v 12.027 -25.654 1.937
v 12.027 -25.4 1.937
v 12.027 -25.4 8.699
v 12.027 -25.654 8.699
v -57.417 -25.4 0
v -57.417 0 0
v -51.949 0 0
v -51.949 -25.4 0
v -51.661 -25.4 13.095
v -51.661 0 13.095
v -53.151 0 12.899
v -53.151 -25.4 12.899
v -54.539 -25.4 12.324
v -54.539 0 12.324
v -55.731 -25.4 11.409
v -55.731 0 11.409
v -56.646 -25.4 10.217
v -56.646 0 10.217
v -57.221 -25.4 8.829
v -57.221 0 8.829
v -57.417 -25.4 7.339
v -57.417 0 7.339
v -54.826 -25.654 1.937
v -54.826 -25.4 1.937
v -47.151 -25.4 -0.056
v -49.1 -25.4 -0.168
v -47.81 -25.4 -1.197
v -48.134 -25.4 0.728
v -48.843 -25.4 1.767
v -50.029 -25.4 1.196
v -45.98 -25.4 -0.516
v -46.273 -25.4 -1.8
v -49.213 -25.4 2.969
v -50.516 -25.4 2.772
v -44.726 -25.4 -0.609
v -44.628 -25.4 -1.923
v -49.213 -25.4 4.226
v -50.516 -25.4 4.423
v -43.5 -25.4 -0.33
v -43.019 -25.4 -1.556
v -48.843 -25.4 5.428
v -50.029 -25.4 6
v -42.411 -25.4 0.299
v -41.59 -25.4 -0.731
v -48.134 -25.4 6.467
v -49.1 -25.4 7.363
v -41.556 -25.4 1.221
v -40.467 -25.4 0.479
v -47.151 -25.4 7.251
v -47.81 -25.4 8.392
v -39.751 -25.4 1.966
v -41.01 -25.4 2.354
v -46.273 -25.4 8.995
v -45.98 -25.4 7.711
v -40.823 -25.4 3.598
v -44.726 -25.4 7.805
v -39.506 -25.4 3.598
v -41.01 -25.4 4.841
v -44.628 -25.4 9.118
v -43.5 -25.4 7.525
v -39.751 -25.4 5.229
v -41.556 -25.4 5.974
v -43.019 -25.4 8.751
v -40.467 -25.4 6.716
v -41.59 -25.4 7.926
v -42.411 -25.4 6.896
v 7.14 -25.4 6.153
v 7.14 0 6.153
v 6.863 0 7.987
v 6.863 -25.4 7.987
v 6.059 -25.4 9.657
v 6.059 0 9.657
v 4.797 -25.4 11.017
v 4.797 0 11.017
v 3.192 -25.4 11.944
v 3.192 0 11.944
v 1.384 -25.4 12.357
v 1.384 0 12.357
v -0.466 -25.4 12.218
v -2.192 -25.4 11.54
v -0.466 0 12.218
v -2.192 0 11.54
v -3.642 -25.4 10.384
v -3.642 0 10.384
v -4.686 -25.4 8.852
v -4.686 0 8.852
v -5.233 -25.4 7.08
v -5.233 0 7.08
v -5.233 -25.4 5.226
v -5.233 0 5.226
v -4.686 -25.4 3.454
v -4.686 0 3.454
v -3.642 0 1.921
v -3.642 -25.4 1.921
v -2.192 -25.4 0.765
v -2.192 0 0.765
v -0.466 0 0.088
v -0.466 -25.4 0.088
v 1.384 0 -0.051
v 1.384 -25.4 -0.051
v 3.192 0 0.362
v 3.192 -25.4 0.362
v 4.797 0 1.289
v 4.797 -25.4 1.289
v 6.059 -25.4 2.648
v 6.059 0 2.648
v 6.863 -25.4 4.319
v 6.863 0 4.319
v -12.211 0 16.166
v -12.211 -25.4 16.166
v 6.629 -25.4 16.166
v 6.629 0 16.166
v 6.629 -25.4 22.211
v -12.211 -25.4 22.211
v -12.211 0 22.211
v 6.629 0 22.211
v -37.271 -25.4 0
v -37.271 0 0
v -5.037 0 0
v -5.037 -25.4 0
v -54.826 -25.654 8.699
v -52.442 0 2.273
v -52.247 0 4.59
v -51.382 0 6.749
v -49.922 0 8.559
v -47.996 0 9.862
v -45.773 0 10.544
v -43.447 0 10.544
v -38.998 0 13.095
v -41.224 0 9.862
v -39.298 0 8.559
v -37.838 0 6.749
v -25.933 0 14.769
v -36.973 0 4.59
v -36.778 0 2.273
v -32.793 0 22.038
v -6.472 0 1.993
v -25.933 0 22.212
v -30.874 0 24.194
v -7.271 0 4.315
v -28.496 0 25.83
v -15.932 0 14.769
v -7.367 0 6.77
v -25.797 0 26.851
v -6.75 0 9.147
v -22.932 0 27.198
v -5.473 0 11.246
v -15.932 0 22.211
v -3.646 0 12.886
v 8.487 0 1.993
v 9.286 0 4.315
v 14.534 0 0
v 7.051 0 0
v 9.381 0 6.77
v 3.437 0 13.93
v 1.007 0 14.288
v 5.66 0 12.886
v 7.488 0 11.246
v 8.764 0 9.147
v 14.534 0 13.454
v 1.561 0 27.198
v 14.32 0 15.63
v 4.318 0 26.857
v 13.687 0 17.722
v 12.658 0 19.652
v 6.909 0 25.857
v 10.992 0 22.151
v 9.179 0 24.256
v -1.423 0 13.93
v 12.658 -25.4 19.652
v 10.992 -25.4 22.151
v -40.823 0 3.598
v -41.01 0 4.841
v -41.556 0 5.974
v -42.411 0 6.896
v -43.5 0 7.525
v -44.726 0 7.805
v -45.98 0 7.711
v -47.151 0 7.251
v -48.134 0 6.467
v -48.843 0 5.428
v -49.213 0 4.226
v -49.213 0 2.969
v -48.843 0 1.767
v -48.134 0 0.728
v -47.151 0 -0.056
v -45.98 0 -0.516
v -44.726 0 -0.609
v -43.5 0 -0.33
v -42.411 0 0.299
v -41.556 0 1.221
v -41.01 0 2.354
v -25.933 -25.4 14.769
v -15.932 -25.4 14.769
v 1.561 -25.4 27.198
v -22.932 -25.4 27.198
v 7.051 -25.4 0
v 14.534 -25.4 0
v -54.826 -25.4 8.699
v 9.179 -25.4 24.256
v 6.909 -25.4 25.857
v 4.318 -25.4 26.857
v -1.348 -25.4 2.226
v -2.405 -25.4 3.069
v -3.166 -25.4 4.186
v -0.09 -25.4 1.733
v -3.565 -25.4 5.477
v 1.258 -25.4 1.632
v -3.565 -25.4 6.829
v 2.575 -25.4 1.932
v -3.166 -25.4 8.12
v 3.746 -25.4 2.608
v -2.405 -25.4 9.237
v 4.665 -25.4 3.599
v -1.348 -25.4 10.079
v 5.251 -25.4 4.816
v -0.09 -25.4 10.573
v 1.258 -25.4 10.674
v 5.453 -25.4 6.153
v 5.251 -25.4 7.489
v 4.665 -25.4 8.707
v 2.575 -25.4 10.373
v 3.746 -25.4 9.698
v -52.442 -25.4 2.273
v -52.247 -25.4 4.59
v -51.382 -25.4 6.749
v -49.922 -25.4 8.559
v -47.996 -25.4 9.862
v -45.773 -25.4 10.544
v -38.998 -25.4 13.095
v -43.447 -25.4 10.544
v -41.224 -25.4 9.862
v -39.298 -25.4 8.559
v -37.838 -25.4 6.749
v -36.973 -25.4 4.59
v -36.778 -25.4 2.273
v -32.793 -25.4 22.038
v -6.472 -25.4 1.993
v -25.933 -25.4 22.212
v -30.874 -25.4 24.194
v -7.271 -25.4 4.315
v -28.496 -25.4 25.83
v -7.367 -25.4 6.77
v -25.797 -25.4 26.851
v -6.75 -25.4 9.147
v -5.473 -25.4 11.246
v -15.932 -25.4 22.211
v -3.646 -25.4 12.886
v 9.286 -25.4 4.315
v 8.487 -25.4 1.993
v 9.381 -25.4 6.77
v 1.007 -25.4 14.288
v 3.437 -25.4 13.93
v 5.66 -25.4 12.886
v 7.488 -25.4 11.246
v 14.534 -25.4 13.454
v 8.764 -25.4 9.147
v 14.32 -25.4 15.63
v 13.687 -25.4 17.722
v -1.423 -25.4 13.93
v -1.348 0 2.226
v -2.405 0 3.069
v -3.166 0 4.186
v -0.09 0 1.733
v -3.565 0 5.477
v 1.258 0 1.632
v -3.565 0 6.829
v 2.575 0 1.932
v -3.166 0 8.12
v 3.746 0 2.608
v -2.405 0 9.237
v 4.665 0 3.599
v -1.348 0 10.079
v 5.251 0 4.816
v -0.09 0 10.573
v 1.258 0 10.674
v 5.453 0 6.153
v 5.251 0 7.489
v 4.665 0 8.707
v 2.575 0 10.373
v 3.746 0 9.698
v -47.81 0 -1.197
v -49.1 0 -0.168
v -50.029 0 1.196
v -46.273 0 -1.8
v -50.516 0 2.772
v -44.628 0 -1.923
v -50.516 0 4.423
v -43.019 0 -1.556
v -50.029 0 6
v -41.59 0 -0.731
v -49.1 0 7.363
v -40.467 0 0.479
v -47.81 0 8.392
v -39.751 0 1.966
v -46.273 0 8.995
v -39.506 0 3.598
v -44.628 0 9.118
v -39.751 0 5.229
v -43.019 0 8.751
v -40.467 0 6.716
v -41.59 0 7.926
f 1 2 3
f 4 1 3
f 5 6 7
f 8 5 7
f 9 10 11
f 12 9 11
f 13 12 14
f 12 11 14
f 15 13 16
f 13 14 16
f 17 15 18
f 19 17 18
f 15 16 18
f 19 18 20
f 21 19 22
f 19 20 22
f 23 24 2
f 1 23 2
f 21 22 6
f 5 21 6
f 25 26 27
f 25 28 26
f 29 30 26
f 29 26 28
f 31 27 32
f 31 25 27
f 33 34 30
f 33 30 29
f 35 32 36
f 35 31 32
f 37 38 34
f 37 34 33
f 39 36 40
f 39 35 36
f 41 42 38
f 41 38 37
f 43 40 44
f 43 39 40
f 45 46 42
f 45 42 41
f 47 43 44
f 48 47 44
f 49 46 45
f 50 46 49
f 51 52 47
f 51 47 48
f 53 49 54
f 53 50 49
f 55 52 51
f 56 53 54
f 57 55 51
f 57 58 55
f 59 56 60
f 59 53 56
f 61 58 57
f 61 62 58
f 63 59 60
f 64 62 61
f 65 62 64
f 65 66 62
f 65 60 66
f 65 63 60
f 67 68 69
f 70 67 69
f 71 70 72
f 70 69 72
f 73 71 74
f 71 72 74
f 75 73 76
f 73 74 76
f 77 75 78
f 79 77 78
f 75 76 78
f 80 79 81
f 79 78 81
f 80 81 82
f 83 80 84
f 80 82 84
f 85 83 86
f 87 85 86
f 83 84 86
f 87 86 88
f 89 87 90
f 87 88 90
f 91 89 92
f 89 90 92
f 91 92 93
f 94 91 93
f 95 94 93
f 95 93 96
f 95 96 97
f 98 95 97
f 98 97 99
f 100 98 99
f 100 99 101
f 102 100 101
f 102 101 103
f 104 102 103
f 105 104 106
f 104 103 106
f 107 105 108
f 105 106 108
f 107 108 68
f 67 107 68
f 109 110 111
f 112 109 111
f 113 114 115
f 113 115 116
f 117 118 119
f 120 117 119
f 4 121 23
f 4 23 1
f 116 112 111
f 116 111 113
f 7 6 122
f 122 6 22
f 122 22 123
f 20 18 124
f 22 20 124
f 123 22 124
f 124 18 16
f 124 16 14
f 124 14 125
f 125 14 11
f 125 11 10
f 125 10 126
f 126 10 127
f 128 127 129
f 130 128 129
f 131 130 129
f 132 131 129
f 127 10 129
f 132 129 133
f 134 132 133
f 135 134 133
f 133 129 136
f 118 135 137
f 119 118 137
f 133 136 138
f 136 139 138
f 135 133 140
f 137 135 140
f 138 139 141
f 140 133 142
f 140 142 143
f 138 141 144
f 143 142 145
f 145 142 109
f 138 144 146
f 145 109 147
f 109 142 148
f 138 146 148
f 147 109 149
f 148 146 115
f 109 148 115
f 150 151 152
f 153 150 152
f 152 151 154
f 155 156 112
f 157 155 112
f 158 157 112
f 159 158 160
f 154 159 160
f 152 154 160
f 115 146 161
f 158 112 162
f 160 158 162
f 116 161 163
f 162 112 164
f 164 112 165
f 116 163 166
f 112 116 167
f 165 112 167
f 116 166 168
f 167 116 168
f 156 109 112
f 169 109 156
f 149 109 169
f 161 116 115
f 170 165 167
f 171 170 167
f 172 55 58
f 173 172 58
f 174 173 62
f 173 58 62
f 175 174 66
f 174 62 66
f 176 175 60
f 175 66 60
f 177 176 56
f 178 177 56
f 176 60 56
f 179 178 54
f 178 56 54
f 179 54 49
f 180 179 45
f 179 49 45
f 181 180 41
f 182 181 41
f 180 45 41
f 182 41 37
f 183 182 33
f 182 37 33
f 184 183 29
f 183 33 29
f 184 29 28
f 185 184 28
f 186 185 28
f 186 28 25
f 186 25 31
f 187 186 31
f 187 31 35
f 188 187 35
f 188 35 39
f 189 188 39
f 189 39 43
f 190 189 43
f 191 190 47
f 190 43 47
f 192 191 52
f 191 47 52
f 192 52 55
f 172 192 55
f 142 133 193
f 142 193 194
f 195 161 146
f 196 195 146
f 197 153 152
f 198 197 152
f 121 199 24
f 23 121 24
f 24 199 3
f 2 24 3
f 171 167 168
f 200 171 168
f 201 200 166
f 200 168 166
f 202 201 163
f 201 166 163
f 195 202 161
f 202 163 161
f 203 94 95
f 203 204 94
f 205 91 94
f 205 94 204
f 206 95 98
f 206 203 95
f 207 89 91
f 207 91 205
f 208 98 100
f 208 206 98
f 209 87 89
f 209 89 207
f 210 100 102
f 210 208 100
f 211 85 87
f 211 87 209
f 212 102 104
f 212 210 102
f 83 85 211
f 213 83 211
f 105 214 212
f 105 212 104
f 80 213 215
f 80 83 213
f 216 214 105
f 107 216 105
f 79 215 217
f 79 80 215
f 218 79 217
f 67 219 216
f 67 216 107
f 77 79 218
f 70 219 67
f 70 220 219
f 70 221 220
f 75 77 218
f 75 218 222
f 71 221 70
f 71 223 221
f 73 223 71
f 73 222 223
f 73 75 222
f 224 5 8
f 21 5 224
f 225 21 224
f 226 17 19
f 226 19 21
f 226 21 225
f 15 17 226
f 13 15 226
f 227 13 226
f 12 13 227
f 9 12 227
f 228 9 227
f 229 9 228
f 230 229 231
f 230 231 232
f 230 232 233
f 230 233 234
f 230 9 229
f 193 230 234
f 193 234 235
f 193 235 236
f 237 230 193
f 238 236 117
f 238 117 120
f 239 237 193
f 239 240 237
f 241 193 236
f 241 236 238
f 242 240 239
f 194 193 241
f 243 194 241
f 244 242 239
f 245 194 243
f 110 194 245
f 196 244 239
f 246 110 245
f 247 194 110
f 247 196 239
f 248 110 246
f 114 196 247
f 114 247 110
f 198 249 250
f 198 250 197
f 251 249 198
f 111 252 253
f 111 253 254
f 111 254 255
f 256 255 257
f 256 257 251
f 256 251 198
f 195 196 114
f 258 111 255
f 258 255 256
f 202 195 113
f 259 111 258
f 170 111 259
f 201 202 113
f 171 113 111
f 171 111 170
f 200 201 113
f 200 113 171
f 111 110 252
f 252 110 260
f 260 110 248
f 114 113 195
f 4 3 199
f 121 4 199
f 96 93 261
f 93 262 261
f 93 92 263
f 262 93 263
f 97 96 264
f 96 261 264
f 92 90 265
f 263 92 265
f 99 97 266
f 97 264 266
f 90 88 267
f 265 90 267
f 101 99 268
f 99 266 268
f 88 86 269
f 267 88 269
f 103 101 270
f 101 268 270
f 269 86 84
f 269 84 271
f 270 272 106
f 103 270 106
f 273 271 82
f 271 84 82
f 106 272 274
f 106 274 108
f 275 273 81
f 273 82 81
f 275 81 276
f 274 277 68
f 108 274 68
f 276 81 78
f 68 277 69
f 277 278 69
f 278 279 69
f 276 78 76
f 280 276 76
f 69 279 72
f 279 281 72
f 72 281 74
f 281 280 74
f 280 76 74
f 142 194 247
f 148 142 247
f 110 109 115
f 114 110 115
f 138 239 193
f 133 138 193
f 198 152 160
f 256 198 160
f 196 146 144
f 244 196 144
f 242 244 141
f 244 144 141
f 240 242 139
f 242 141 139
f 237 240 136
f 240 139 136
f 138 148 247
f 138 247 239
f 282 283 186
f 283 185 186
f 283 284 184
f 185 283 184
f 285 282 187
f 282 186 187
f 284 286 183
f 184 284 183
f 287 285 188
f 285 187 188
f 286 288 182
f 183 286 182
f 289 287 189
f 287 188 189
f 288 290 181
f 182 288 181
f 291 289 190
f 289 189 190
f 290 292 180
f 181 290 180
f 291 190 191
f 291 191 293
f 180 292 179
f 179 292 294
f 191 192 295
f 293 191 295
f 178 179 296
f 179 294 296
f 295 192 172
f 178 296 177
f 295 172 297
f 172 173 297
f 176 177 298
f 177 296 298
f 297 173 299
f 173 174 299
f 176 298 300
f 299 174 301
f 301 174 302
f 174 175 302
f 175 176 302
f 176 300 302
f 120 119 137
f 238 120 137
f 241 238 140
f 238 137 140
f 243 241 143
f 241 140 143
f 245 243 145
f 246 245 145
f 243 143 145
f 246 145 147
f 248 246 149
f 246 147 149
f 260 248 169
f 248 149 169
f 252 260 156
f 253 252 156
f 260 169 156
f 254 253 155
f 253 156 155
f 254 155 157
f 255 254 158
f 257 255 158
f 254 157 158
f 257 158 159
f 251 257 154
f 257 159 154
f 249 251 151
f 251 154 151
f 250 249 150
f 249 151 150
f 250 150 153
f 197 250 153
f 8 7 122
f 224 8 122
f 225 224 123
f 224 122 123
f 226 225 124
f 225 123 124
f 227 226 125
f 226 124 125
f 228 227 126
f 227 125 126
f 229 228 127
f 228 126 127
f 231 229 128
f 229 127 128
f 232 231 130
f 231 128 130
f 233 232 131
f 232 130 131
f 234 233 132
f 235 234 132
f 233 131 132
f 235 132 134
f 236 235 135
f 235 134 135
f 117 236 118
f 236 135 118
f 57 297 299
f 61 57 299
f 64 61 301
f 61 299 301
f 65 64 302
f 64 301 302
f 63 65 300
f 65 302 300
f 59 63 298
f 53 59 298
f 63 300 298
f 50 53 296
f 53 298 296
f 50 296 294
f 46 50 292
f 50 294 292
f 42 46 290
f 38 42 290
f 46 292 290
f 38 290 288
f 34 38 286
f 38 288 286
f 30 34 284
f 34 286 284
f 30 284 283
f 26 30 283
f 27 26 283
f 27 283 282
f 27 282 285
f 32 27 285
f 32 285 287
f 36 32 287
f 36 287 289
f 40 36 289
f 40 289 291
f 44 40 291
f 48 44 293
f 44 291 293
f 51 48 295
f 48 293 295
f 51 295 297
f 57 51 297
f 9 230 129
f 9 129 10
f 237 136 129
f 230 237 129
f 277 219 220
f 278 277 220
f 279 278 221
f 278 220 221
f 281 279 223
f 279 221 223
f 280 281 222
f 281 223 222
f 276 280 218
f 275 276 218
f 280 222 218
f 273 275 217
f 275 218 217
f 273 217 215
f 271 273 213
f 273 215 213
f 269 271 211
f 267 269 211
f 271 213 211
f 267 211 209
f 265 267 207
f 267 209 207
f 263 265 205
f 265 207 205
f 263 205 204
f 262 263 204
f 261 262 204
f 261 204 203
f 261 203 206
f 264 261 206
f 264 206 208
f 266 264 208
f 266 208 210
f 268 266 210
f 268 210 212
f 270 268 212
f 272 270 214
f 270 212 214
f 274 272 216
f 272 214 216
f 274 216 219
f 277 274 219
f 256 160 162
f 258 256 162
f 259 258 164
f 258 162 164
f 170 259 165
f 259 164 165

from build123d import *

# Parameters (mm, degrees)
F1_DEPTH  = 25.4
F2_R      = 5.5360546203
F3_DEPTH  = 25.4
F4_DEPTH  = 25.4
F2_R_2    = 6.2210843251
F6_DEPTH  = 25.4
F7_R      = 4.2188641231
F8_DEPTH  = 25.4
F9_R      = 4.5339
F10_DEPTH = 25.4
F11_W     = 18.8395641744
F11_H     = 6.0452
F12_DEPTH = 25.4
F14_DEPTH = 0.254


with BuildPart() as f1:
    # F0 (on Front) → F1 (new body)
    with BuildSketch(Plane.XZ):
        with BuildLine():
            Line((-57.4172474444, 7.3390481994), (-57.4172474444, 0))
            Line((-57.4172474444, 0), (-51.9489385188, 0))
            ThreePointArc((-51.9489385188, 0), (-44.6098931134, 10.6301150636), (-37.270847708, 0))
            Line((-37.270847708, 0), (-5.0366003998, 0))
            ThreePointArc((-5.0366003998, 0), (1.0073210578, 14.2884177934), (7.0512425154, 0))
            Line((7.0512425154, 0), (14.5341902971, 0))
            Line((14.5341902971, 0), (14.5341902971, 13.4535404691))
            ThreePointArc((14.5341902971, 13.4535404691), (14.0547536864, 16.6914740863), (12.6575871379, 19.6515415194))
            Line((12.6575871379, 19.6515415194), (10.9915433626, 22.1506080808))
            ThreePointArc((10.9915433626, 22.1506080808), (6.9091175886, 25.8565418479), (1.5610721514, 27.1976441145))
            Line((1.5610721514, 27.1976441145), (0, 27.1976441145))
            Line((0, 27.1976441145), (-22.9318366948, 27.1976441145))
            ThreePointArc((-22.9318366948, 27.1976441145), (-28.4964708638, 25.8297038573), (-32.7926497885, 22.0377043017))
            Line((-32.7926497885, 22.0377043017), (-38.9976799488, 13.0951618776))
            Line((-38.9976799488, 13.0951618776), (-51.6611337662, 13.0951618776))
            ThreePointArc((-51.6611337662, 13.0951618776), (-55.7313207813, 11.4092352145), (-57.4172474444, 7.3390481994))
        make_face()
    extrude(amount=F1_DEPTH)

    # F5 (on face) → F6 (cut)
    with BuildSketch(Plane.XZ.offset(25.4)):
        Polygon((-15.9322246909, 22.2114877799), (-25.9334743023, 22.2120806575), (-25.9334743023, 14.7692877799), (-15.9322246909, 14.7692877799), align=None)
    extrude(amount=-F6_DEPTH, mode=Mode.SUBTRACT)

    # F11 (on face) → F12 (cut)
    with BuildSketch(Plane.XZ.offset(25.4)):
        with Locations((-2.7910470963, 19.1888877799)):
            Rectangle(F11_W, F11_H)
    extrude(amount=-F12_DEPTH, mode=Mode.SUBTRACT)


with BuildPart() as f3:
    # F2 (on Front) → F3 (new body)
    with BuildSketch(Plane.XZ):
        with Locations((-45.0416021049, 3.597572213)):
            Circle(F2_R)
    extrude(amount=F3_DEPTH)

    # F2 (on Front) → F4 (join)
    with BuildSketch(Plane.XZ):
        with Locations((-45.0416021049, 3.597572213)):
            Circle(F2_R)
    extrude(amount=F4_DEPTH)

    # F7 (on face) → F8 (cut)
    with BuildSketch(Plane.XZ.offset(25.4)):
        with Locations((-45.0416021049, 3.597572213)):
            Circle(F7_R)
    extrude(amount=-F8_DEPTH, mode=Mode.SUBTRACT)


with BuildPart() as f4:
    # F2 (on Front) → F4, piece 2 (new body)
    with BuildSketch(Plane.XZ):
        with Locations((0.9186911047, 6.1528771184)):
            Circle(F2_R_2)
    extrude(amount=F4_DEPTH)

    # F9 (on face) → F10 (cut)
    with BuildSketch(Plane.XZ.offset(25.4)):
        with Locations((0.9186911047, 6.1528771184)):
            Circle(F9_R)
    extrude(amount=-F10_DEPTH, mode=Mode.SUBTRACT)


with BuildPart() as f14:
    # F13 (on face) → F14 (new body)
    with BuildSketch(Plane.XZ.offset(25.4)):
        with BuildLine():
            Line((-6.9244429038, 8.6988350376), (-39.4537838029, 8.6988350376))
            ThreePointArc((-39.4537838029, 8.6988350376), (-37.3012745222, 5.6422189833), (-36.8070187444, 1.9365599146))
            Line((-36.8070187444, 1.9365599146), (-6.4423901031, 1.9365599146))
            ThreePointArc((-6.4423901031, 1.9365599146), (-7.3938416859, 5.2670543948), (-6.9244429038, 8.6988350376))
        make_face()
        with BuildLine():
            Line((-49.7660024239, 8.6988350376), (-54.8260457921, 8.6988350376))
            Line((-54.8260457921, 8.6988350376), (-54.8260457921, 1.9365599146))
            Line((-54.8260457921, 1.9365599146), (-52.4127674823, 1.9365599146))
            ThreePointArc((-52.4127674823, 1.9365599146), (-51.9185117045, 5.6422189833), (-49.7660024239, 8.6988350376))
        make_face()
        with BuildLine():
            Line((-39.4537838029, 8.6988350376), (-49.7660024239, 8.6988350376))
            ThreePointArc((-49.7660024239, 8.6988350376), (-51.9185117045, 5.6422189833), (-52.4127674823, 1.9365599146))
            Line((-52.4127674823, 1.9365599146), (-36.8070187444, 1.9365599146))
            ThreePointArc((-36.8070187444, 1.9365599146), (-37.3012745222, 5.6422189833), (-39.4537838029, 8.6988350376))
        make_face()
        with BuildLine():
            Line((8.9390850195, 8.6988350376), (-6.9244429038, 8.6988350376))
            ThreePointArc((-6.9244429038, 8.6988350376), (-7.3938416859, 5.2670543948), (-6.4423901031, 1.9365599146))
            Line((-6.4423901031, 1.9365599146), (8.4570322187, 1.9365599146))
            ThreePointArc((8.4570322187, 1.9365599146), (9.4084838016, 5.2670543948), (8.9390850195, 8.6988350376))
        make_face()
        with BuildLine():
            Line((12.0267542079, 8.6988350376), (8.9390850195, 8.6988350376))
            ThreePointArc((8.9390850195, 8.6988350376), (9.4084838016, 5.2670543948), (8.4570322187, 1.9365599146))
            Line((8.4570322187, 1.9365599146), (12.0267542079, 1.9365599146))
            Line((12.0267542079, 1.9365599146), (12.0267542079, 8.6988350376))
        make_face()
    extrude(amount=F14_DEPTH)


solid = Compound([f1.part, f3.part, f4.part, f14.part])
